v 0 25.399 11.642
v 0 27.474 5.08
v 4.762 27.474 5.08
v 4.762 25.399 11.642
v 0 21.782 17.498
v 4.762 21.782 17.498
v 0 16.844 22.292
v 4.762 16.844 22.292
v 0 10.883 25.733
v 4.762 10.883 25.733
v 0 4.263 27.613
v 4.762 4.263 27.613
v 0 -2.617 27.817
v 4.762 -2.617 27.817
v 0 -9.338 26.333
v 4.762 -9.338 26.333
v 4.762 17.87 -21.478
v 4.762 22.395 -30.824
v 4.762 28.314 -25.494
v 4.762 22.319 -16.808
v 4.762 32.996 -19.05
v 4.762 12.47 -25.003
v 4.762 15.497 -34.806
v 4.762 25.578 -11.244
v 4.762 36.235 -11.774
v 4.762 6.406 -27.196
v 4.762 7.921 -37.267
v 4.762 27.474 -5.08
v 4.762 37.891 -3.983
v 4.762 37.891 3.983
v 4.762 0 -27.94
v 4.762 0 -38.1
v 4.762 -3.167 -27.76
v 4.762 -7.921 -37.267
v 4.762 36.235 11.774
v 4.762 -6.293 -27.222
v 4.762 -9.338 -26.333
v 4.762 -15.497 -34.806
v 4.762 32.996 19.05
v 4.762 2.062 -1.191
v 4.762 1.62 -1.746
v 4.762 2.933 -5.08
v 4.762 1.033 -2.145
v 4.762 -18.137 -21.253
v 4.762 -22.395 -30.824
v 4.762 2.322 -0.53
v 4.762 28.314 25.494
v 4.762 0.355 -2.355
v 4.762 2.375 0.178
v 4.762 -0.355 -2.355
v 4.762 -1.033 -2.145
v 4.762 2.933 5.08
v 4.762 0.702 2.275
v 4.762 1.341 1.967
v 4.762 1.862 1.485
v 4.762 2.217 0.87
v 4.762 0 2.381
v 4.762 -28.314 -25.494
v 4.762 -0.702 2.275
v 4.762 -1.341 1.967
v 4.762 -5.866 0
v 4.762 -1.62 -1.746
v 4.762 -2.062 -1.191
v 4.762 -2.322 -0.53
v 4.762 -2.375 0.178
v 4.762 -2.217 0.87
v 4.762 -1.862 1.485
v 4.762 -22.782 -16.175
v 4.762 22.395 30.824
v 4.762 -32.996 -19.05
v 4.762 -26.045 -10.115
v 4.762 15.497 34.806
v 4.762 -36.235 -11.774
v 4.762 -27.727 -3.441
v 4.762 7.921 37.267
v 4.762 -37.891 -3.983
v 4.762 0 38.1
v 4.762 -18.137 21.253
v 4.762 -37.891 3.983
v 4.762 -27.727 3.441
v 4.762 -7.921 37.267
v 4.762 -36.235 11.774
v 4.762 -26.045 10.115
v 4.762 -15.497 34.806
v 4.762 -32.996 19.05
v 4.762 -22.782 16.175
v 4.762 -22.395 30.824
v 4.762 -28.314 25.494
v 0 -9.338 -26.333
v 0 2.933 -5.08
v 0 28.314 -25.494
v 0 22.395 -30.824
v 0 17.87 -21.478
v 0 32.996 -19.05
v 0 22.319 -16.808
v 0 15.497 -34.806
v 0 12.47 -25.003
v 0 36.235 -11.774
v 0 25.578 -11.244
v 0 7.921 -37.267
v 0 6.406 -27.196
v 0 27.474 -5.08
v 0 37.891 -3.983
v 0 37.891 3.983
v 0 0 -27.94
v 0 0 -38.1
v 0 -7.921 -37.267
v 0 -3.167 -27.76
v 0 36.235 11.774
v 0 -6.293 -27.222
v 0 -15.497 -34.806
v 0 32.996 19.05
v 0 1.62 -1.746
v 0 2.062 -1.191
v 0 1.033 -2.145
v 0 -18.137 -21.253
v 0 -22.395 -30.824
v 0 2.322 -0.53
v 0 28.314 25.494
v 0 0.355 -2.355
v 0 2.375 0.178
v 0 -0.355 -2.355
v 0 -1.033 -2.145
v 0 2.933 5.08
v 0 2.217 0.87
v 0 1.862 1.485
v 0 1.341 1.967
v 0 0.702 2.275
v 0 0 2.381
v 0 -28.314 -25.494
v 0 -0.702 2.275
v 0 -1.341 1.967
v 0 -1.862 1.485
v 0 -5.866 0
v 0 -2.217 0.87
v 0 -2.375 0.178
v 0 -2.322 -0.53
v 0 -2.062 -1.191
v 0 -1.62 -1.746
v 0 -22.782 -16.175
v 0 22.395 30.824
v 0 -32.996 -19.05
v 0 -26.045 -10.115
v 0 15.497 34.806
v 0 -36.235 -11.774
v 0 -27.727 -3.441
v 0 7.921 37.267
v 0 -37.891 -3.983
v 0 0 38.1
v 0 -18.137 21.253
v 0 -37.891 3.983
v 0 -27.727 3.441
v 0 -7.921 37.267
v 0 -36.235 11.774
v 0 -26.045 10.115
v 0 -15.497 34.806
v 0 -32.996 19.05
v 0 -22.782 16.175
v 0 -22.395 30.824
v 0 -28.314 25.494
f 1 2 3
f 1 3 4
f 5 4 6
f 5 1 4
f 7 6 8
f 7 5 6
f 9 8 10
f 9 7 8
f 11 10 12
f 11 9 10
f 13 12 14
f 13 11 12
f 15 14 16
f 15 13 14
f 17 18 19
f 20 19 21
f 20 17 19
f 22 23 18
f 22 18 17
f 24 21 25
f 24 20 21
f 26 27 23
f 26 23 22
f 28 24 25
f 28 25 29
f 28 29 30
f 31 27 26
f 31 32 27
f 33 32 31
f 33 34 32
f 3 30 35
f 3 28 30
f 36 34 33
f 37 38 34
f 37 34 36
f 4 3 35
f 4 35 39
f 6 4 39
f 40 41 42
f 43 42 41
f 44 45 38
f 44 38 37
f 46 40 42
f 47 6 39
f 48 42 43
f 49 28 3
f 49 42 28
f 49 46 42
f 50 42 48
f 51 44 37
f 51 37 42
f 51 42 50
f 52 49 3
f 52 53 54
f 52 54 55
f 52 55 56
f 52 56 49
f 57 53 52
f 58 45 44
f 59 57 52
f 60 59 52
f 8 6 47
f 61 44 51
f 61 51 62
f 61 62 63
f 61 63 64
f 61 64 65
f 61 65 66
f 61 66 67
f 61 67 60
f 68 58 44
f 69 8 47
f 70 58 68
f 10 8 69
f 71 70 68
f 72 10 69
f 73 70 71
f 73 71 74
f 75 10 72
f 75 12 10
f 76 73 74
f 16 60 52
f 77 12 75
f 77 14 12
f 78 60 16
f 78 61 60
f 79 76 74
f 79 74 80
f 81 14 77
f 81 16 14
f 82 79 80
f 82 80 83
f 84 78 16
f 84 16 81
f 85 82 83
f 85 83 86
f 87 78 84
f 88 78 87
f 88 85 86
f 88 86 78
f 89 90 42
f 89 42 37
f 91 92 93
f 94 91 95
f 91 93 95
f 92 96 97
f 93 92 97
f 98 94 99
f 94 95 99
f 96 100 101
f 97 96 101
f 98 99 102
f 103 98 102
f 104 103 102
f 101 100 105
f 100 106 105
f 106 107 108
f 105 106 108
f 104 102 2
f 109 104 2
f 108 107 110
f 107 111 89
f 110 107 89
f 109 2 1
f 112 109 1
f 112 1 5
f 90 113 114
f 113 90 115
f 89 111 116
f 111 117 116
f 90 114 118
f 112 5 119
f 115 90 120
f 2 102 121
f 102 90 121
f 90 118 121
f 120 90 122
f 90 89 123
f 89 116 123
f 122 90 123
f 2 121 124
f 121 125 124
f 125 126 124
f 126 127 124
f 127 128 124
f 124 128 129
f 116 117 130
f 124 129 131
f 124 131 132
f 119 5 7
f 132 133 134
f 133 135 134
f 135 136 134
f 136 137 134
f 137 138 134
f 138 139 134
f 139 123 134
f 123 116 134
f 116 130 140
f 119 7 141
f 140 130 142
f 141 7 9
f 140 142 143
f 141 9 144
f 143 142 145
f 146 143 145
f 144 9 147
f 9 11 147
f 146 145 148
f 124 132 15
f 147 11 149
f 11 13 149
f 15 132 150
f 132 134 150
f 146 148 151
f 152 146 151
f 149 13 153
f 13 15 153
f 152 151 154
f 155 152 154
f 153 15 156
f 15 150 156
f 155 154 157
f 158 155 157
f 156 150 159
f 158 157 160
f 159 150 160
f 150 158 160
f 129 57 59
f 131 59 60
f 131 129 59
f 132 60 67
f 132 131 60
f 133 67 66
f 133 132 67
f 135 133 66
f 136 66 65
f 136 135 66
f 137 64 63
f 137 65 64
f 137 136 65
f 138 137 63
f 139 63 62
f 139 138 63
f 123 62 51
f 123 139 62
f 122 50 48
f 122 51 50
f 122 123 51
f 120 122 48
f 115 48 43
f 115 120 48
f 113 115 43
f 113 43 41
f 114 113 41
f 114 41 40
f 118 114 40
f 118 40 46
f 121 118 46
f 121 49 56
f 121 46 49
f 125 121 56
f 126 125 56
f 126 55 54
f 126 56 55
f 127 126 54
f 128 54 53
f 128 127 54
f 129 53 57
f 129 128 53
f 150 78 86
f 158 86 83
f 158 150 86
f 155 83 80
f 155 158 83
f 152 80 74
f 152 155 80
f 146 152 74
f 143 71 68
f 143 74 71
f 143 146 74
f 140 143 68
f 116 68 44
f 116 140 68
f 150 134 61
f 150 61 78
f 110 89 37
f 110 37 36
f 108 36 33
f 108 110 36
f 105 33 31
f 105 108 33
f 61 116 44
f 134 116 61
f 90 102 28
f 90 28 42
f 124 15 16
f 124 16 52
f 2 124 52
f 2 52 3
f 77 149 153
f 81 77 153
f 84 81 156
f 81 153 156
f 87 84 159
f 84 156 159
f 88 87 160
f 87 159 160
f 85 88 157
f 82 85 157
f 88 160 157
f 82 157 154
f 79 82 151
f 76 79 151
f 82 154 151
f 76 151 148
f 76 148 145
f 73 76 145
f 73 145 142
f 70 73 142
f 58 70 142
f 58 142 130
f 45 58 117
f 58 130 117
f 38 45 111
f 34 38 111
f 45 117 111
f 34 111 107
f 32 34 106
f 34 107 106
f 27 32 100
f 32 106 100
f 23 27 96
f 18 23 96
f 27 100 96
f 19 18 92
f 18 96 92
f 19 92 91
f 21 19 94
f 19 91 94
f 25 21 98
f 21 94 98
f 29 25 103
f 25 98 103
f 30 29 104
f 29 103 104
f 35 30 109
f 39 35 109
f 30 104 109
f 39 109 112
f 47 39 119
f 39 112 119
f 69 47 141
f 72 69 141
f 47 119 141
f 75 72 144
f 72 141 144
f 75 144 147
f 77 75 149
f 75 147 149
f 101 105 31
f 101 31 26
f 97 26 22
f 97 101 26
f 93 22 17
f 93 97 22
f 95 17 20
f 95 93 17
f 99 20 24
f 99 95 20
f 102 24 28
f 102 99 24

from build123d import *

# Parameters (mm, degrees)
SKETCH2_R           = 38.1
BOSS_EXTRUDE5_DEPTH = 4.7625
SKETCH2_3_R         = 2.38125
CUT_EXTRUDE3_DEPTH  = 55.091601994


with BuildPart() as part:
    # Sketch2 → Boss-Extrude5 (new body)
    with BuildSketch(Plane(origin=(0, 0, 0), x_dir=(0, 0, -1), z_dir=(1, 0, 0))):
        Circle(SKETCH2_R)
    extrude(amount=BOSS_EXTRUDE5_DEPTH)

    # Sketch2<3> → Cut-Extrude3 (cut, through all)
    with BuildSketch(Plane(origin=(0, 0, 0), x_dir=(0, 0, -1), z_dir=(1, 0, 0))):
        with BuildLine():
            Line((21.253442374, -18.136559411), (0, -5.865878735))
            Line((0, -5.865878735), (-21.253442374, -18.136559411))
            ThreePointArc((-21.253442374, -18.136559411), (0, -27.94), (21.253442374, -18.136559411))
        make_face()
        with BuildLine():
            Line((-26.333442374, -9.337741308), (-5.08, 2.932939367))
            Line((-5.08, 2.932939367), (-5.08, 27.474300719))
            ThreePointArc((-5.08, 27.474300719), (-24.196749782, 13.97), (-26.333442374, -9.337741308))
        make_face()
        with BuildLine():
            Line((5.08, 2.932939367), (26.333442374, -9.337741308))
            ThreePointArc((26.333442374, -9.337741308), (24.196749782, 13.97), (5.08, 27.474300719))
            Line((5.08, 27.474300719), (5.08, 2.932939367))
        make_face()
        Circle(SKETCH2_3_R)
    extrude(amount=CUT_EXTRUDE3_DEPTH, mode=Mode.SUBTRACT)


solid = part.part
